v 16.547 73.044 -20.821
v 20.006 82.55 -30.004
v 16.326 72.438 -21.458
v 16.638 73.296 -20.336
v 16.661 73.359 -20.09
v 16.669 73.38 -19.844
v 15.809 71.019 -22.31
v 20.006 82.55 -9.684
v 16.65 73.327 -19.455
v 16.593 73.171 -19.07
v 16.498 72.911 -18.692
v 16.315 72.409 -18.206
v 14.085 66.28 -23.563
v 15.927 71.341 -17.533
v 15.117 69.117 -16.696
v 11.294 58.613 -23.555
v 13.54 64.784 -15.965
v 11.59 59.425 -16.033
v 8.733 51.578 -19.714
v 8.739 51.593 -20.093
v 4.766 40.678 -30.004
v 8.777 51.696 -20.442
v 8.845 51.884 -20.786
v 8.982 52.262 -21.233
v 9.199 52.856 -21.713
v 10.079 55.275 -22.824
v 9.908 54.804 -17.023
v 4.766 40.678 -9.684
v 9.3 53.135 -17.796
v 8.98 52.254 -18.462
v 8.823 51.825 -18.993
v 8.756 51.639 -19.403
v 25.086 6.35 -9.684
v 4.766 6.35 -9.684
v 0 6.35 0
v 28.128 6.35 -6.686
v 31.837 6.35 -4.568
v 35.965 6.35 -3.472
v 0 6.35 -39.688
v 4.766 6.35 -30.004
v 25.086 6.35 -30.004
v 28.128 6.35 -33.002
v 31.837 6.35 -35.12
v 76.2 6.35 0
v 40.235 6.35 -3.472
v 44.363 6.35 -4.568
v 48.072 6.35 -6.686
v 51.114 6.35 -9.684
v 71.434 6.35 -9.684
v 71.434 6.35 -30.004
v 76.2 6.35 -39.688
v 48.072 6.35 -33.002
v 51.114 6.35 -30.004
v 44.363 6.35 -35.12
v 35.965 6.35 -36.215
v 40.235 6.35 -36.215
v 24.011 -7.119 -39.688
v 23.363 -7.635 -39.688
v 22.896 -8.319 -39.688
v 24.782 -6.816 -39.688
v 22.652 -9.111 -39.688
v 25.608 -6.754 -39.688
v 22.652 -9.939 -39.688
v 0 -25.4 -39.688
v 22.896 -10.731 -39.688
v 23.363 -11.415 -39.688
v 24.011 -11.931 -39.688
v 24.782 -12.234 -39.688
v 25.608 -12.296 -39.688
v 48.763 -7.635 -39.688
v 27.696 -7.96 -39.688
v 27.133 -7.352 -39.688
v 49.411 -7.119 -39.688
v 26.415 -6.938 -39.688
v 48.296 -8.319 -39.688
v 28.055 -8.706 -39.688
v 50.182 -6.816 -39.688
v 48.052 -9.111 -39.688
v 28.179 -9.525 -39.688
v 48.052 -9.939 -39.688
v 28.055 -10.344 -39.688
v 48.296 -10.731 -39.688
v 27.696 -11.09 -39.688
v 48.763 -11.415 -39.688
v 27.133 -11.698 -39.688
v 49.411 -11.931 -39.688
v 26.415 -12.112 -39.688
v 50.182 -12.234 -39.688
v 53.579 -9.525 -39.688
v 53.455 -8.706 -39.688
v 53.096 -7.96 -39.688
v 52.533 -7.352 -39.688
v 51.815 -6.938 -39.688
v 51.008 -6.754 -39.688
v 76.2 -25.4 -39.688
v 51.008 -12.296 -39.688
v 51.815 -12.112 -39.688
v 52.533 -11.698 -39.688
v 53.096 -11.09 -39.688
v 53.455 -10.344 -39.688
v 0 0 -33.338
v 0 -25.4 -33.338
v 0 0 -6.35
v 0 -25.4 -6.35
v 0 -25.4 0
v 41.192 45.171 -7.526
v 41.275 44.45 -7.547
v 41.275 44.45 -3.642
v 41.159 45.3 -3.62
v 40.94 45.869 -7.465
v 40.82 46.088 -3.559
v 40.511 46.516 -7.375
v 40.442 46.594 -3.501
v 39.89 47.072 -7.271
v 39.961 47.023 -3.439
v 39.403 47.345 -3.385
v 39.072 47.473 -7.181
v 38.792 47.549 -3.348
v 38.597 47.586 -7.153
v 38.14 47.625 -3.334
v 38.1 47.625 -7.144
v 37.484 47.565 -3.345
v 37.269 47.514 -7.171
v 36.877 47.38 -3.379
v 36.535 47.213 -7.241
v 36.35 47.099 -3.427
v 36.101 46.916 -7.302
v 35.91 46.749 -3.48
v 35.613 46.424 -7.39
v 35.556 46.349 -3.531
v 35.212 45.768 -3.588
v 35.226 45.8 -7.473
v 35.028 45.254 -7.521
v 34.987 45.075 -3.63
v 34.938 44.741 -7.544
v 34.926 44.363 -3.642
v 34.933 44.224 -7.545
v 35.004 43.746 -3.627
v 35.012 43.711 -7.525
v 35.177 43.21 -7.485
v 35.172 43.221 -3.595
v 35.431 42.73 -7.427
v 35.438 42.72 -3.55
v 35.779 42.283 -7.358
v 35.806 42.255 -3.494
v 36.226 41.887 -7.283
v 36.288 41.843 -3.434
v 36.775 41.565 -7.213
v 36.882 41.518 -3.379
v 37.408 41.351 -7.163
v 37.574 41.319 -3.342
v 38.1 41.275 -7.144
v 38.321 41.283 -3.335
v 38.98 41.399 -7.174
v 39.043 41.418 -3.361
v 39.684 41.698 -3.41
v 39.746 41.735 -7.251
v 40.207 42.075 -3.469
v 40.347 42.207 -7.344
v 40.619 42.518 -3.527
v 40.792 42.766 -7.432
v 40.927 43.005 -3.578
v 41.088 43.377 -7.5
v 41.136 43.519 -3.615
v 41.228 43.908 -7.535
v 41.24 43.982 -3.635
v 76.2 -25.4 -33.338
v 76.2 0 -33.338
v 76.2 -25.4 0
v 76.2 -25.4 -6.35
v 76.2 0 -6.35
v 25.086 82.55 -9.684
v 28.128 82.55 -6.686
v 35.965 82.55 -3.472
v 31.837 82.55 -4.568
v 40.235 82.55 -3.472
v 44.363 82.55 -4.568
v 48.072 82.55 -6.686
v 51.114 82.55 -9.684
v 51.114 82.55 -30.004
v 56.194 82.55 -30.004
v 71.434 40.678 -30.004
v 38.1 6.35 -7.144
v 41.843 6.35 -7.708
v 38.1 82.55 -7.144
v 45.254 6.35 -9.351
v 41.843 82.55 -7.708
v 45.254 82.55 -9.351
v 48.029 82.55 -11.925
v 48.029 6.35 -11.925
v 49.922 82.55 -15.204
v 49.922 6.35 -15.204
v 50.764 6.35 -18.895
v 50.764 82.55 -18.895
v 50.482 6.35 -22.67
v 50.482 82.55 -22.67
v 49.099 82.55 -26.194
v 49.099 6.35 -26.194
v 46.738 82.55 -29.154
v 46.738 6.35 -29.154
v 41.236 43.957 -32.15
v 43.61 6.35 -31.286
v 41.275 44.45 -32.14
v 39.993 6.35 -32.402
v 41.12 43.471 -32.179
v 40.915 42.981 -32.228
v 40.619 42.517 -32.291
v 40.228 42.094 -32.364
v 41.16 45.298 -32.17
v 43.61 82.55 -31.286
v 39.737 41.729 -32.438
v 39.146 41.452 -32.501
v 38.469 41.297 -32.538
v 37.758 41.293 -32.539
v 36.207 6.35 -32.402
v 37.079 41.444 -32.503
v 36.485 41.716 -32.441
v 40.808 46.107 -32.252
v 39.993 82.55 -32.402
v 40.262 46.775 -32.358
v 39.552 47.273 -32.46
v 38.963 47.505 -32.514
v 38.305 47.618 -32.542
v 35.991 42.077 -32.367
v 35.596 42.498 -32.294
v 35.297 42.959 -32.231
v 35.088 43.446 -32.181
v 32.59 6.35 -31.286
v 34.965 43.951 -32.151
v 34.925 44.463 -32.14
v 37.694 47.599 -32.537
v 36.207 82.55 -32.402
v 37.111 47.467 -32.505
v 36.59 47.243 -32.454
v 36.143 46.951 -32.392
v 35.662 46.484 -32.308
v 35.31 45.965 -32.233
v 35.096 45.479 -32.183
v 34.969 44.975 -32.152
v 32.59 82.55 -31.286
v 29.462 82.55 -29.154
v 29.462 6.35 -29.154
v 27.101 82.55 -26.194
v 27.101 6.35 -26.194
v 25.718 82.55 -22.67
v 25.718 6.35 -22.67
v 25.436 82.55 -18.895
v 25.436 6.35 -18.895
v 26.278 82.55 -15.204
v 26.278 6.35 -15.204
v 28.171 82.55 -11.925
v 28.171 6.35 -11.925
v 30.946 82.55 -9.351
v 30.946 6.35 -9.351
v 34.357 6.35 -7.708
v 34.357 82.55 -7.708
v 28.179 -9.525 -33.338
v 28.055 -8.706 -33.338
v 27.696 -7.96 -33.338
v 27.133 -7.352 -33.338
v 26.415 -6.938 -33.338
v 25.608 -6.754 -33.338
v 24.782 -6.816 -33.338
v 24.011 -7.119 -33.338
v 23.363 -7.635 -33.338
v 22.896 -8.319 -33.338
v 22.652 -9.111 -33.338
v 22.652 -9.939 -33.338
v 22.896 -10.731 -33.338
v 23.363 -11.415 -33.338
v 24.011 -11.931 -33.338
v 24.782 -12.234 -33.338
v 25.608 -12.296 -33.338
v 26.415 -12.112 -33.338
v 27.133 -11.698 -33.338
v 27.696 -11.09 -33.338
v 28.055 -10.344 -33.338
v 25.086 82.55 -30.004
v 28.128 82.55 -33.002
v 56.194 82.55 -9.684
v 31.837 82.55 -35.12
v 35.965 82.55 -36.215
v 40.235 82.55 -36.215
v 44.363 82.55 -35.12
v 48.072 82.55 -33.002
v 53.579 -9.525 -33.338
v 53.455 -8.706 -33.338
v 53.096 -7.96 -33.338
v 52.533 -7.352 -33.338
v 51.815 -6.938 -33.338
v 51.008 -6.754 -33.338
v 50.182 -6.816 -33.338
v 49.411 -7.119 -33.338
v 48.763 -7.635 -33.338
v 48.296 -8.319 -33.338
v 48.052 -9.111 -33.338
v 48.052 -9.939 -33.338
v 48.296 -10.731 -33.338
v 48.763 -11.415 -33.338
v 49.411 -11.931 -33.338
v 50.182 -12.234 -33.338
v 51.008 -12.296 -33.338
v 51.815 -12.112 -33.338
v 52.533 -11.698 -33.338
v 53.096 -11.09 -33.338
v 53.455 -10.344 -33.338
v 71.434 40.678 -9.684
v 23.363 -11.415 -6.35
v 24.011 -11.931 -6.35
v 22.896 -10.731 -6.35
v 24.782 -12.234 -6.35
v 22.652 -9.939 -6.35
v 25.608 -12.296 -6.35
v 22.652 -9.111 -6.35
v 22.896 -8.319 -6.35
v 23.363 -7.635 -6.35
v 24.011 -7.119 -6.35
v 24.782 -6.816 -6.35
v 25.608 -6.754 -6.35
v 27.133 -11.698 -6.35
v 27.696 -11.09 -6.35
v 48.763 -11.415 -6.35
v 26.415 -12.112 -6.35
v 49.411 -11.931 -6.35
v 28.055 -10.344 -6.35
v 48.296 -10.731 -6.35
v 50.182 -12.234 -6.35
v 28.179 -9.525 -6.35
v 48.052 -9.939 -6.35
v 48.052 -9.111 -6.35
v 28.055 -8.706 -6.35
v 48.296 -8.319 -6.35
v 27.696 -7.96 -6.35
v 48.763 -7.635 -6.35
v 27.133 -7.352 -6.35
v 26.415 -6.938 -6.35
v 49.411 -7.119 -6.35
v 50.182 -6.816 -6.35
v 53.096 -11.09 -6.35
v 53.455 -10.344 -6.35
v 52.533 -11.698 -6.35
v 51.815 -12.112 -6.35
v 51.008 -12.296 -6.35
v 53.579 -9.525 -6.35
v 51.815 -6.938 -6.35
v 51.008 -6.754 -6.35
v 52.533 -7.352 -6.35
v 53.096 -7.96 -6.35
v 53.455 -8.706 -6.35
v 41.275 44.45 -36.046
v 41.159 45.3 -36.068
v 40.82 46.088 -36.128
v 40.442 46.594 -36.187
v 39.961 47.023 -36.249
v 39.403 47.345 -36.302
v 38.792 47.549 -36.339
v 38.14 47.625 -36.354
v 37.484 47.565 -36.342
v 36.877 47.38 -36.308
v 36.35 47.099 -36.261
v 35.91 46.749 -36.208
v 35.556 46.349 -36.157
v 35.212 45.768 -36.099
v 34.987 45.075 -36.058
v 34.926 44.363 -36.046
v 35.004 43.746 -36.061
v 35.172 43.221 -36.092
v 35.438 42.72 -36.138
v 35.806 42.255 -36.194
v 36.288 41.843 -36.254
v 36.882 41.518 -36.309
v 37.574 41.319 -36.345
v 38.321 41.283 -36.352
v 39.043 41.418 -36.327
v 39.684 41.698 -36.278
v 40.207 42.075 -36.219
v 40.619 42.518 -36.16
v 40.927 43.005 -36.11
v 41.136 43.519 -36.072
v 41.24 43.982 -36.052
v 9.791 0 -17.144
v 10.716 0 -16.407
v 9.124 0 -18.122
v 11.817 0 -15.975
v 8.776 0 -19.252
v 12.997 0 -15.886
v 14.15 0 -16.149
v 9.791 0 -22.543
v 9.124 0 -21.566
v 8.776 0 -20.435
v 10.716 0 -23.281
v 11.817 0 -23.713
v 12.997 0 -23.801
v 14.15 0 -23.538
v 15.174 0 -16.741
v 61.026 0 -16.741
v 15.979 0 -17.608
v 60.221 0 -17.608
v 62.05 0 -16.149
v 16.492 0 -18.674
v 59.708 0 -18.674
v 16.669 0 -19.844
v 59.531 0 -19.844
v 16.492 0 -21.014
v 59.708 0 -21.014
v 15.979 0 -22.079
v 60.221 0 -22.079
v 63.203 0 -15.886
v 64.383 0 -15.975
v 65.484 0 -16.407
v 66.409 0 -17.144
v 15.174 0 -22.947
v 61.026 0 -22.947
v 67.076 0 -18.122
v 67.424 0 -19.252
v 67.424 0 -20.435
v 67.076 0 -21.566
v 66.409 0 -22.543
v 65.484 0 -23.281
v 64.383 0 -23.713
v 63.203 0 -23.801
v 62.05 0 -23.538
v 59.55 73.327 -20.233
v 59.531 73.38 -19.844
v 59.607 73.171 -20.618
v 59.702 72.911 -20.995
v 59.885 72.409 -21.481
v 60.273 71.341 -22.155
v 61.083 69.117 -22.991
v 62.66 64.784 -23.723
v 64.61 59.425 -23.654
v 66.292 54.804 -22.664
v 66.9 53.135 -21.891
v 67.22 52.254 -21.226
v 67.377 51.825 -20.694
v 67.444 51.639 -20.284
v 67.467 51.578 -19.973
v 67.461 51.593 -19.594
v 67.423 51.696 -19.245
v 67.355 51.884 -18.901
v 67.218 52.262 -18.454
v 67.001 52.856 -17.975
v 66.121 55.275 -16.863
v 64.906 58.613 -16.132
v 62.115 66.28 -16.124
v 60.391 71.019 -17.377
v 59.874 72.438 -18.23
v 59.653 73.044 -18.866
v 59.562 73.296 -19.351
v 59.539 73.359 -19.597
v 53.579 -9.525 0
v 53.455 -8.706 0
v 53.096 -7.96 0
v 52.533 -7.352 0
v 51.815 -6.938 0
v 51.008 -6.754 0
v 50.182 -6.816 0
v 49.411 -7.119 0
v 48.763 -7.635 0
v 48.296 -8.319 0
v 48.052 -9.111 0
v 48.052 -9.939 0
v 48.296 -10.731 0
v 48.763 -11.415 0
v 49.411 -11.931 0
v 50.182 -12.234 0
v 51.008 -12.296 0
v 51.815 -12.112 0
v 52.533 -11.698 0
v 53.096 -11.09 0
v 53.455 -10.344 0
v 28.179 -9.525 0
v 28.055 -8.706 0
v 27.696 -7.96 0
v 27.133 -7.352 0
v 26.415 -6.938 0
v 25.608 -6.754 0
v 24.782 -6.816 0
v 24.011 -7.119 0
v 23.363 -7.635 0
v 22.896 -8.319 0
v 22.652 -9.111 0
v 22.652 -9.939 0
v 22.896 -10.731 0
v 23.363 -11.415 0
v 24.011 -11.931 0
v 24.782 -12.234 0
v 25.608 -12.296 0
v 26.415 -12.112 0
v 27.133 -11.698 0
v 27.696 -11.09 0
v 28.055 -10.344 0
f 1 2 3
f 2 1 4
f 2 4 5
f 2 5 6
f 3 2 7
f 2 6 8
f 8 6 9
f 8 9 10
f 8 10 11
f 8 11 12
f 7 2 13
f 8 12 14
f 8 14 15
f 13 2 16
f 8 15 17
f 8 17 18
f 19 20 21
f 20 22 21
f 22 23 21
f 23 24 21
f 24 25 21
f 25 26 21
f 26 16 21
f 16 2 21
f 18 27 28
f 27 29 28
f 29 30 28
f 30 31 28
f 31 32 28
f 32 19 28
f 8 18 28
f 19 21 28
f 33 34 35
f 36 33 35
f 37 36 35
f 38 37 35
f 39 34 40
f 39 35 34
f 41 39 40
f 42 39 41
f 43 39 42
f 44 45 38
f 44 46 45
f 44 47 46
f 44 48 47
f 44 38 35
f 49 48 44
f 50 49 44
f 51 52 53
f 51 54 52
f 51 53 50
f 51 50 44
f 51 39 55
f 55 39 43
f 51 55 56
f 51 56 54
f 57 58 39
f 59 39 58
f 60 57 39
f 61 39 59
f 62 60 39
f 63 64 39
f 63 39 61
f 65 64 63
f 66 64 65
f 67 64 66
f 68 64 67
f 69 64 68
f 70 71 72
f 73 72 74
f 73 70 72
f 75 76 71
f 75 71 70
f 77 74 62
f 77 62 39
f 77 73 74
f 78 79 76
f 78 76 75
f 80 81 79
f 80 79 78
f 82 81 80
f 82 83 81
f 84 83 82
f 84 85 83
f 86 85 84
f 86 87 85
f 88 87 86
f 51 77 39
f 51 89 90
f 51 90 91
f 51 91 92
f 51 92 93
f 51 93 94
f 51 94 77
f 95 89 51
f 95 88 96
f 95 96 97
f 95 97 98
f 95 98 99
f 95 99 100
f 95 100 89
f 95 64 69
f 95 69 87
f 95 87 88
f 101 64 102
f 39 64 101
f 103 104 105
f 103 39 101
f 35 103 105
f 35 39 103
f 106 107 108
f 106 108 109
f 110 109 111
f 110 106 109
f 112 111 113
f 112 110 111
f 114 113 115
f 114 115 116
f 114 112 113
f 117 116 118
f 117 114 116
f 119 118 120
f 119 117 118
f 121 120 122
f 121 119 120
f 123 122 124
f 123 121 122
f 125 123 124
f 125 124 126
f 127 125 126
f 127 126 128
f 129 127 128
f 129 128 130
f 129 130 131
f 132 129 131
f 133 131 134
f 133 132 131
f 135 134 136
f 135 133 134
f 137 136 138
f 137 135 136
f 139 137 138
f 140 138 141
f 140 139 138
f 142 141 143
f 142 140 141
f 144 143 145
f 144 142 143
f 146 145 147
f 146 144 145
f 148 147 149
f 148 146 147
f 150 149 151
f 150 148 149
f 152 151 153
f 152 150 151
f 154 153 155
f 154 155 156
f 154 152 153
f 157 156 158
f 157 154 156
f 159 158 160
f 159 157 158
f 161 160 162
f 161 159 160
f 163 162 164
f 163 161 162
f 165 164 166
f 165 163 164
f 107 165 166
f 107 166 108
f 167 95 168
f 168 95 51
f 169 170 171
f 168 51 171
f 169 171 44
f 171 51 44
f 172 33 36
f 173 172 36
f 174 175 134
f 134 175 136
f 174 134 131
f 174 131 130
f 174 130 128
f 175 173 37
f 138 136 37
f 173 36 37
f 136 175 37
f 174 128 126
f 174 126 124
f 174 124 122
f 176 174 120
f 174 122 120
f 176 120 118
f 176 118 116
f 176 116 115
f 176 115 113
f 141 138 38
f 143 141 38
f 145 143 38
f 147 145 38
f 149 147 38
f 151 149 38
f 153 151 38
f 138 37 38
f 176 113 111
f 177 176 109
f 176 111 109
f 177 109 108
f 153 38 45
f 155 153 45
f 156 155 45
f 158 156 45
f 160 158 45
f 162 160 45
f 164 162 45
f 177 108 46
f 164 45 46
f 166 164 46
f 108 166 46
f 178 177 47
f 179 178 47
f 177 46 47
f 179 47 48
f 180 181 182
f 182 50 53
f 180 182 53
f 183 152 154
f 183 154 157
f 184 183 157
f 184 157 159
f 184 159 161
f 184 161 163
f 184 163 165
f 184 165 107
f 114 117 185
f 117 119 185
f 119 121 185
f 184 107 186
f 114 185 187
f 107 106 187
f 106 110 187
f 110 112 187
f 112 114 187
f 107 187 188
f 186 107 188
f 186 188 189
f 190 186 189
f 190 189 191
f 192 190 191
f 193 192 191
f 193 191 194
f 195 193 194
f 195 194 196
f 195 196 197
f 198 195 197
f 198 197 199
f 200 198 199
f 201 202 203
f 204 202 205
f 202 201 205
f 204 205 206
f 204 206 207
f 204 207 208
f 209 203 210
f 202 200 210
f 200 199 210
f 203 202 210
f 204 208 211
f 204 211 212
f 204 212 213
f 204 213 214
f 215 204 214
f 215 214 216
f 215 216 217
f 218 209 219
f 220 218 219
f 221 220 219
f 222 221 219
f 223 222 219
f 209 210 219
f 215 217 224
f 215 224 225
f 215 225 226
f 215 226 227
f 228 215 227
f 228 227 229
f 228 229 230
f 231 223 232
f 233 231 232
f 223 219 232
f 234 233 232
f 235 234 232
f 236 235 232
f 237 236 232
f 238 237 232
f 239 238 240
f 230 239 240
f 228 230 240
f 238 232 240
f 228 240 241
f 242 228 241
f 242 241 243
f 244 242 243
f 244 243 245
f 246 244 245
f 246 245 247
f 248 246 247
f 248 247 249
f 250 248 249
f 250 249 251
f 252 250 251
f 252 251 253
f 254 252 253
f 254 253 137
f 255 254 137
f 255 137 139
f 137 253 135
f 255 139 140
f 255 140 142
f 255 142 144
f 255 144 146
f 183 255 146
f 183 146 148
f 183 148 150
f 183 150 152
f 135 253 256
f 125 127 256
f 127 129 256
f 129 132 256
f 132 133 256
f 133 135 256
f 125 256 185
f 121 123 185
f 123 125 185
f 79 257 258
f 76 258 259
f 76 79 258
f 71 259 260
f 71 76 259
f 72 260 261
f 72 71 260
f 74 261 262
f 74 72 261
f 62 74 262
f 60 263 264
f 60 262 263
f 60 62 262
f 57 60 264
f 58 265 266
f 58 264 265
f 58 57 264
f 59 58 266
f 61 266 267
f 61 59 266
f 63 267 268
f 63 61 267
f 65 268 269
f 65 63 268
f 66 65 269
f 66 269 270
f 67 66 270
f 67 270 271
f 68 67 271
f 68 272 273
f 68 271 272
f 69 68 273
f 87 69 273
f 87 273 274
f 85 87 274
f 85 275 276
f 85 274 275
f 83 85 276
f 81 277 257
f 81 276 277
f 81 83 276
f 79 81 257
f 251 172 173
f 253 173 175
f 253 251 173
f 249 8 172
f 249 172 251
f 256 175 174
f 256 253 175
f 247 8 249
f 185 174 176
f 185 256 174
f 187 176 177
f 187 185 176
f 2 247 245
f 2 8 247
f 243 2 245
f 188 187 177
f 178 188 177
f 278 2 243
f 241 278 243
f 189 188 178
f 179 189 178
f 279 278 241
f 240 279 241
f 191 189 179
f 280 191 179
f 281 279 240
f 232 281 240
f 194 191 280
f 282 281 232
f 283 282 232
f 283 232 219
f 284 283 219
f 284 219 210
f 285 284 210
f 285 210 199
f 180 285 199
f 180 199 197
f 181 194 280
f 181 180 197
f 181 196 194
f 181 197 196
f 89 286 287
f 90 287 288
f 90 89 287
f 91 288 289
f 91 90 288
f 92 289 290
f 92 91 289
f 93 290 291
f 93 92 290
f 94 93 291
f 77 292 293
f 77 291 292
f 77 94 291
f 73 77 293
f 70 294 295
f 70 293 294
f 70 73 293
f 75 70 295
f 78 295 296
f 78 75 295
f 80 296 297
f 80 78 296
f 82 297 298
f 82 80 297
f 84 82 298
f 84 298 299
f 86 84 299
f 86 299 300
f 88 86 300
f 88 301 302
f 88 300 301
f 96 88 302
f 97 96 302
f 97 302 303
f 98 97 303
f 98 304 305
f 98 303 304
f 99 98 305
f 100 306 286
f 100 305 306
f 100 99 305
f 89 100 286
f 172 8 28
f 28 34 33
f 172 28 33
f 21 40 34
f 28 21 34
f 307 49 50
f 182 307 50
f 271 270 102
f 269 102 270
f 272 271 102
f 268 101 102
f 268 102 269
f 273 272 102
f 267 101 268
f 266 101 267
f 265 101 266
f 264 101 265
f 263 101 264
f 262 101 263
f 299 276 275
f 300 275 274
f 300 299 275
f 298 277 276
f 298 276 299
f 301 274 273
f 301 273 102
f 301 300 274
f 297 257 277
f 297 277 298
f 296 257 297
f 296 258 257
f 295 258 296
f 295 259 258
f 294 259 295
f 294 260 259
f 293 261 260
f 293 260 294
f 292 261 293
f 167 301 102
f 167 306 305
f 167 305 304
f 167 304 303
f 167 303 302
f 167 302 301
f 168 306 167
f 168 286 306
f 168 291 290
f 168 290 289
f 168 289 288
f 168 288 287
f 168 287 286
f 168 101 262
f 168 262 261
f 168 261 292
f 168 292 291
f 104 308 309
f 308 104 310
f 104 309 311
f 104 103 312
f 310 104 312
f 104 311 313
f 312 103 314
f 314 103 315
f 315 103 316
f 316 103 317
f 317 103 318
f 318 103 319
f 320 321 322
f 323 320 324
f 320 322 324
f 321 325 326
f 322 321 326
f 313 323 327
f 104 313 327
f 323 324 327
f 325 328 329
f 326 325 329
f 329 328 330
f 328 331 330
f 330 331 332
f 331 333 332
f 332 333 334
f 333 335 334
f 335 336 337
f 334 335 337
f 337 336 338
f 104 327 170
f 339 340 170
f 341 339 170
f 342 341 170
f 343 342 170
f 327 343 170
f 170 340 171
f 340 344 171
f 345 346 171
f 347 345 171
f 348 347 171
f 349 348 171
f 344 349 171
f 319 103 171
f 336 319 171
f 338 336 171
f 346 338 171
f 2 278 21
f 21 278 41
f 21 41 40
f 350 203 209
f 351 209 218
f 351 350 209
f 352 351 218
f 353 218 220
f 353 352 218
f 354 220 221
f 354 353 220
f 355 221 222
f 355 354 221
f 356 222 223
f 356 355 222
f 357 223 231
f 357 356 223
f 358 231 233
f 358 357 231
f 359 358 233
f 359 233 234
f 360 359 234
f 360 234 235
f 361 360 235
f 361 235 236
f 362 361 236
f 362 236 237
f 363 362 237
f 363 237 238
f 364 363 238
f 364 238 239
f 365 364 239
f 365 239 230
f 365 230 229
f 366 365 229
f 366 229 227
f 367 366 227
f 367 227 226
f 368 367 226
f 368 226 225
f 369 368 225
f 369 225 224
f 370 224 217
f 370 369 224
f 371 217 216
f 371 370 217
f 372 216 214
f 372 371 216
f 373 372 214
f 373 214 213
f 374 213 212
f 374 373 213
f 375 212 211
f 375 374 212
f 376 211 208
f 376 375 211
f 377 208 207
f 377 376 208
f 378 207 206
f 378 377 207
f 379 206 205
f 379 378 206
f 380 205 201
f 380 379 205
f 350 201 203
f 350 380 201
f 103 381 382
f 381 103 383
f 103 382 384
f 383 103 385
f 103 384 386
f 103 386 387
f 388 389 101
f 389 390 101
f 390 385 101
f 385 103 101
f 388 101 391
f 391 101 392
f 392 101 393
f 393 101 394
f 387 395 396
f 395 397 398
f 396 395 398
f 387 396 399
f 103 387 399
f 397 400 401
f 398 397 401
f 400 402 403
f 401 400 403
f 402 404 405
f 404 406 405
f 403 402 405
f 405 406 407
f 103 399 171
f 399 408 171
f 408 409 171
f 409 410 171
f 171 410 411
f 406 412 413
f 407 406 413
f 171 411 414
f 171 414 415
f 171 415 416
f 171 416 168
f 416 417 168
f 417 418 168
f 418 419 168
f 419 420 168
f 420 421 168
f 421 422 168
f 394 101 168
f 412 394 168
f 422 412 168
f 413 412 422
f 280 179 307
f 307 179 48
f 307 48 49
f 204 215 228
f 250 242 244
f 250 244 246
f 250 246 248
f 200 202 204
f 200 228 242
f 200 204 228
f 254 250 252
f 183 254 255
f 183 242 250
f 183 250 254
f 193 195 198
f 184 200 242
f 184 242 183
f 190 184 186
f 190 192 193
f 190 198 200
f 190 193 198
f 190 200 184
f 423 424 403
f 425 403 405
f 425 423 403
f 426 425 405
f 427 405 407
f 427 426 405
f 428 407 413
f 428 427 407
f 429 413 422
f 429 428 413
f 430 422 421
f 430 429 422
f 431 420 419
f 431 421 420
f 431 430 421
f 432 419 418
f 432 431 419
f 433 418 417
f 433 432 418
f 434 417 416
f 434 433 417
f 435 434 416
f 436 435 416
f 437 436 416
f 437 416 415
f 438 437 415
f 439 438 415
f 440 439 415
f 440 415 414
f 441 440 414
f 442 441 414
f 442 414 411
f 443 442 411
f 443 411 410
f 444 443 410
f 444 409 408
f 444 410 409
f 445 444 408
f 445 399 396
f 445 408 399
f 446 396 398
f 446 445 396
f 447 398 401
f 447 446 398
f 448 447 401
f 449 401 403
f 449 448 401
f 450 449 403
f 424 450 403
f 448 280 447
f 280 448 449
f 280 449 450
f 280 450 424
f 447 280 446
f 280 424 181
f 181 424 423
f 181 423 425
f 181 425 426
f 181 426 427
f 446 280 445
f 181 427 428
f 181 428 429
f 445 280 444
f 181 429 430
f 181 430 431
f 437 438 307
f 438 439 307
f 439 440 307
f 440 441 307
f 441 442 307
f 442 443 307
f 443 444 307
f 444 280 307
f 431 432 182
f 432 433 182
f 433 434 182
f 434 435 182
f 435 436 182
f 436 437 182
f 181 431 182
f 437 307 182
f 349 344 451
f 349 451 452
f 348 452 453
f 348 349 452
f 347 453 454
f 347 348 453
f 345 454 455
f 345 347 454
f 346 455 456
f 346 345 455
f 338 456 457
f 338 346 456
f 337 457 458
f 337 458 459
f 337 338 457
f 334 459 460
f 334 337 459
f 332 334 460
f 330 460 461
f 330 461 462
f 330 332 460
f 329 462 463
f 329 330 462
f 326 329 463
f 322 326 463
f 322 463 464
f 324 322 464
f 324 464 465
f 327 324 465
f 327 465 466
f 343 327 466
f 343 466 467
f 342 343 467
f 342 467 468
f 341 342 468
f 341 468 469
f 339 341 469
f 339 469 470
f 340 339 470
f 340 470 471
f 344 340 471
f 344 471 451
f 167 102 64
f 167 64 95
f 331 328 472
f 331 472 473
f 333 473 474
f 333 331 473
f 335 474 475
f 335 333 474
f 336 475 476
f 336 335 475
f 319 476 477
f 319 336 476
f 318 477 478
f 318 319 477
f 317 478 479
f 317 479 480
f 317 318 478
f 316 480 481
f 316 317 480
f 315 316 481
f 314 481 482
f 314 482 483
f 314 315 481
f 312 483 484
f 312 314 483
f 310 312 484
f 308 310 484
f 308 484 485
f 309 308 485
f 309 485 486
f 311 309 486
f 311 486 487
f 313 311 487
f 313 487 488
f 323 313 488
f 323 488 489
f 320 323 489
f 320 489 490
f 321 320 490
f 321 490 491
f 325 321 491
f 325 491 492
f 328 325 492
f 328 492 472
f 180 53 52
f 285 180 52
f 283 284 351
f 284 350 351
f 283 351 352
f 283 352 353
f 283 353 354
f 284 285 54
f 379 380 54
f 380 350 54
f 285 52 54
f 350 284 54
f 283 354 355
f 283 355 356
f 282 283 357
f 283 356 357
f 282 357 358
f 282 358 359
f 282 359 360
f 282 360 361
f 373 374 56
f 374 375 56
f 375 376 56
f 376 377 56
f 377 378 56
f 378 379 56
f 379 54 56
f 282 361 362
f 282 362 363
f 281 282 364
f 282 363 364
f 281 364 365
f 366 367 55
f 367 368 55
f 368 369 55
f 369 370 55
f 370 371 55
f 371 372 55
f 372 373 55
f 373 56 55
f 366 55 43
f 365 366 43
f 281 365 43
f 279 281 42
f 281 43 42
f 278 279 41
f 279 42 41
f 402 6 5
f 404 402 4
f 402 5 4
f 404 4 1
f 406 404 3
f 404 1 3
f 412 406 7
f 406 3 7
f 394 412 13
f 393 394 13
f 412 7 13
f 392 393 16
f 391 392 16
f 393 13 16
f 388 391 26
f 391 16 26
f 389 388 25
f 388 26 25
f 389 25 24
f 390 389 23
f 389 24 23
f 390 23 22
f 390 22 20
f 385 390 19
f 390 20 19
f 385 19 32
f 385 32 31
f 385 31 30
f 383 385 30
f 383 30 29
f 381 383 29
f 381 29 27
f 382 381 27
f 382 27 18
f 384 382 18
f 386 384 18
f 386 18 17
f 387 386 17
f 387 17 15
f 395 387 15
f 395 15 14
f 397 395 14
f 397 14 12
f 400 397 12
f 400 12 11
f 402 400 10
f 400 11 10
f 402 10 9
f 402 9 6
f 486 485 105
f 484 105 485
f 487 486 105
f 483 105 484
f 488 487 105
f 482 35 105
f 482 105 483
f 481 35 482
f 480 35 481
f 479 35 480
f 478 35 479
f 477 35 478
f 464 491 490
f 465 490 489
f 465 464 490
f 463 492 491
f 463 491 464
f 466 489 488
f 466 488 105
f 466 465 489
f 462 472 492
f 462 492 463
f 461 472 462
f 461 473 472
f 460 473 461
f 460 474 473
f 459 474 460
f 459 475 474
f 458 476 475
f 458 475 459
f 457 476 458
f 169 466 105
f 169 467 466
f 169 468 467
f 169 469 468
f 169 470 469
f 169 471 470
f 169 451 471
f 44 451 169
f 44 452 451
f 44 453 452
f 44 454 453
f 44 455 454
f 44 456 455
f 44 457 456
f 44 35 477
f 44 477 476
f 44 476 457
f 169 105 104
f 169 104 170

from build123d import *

# Parameters (mm, degrees)
SKETCH1_W                                 = 76.2
SKETCH1_H                                 = 39.6875
BASE_DEPTH                                = 6.35
SKETCH2_W                                 = 76.2
SKETCH2_H                                 = 6.35
WALLS_DEPTH                               = 25.4
SCREW_START                               = -39.6875
SCREW_HOLE_OUTLINE_R                      = 2.77876
SCREW_HOLE_DEPTH                          = 39.6875
HOLE_PATTERN_COUNT                        = 2
HOLE_PATTERN_PITCH                        = 25.4
TOP_SECTION_DEPTH                         = 76.2
BOLT_HOLE_CHAMFER_SIZE                    = 15.24
BOLT_HOLE_CHAMFER_SIZE2                   = 41.871555872
SKETCH24_R                                = 12.7
TEMP_POLE_HOLE_DEPTH                      = 76.2
SKETCH26_R                                = 3.96875
TEMP_BOLT_HOLES_DEPTH                     = 138.966445762
TOP_SECTION_BROOM_SUPPORT_HOLE_DEPTH      = 115.222803793
TOP_SECTION_BROOM_SUPPORT_HOLE_DEPTH_BACK = 115.222803793
SKETCH28_R                                = 3.175


# Read off the part's stored shape, not the designer's step: Screw hole
with BuildPart() as part:
    # Sketch1 → Base (new body)
    with BuildSketch(Plane(origin=(0, 0, 0), x_dir=(1, 0, 0), z_dir=(0, 1, 0))):
        with Locations((38.1, 19.84375)):
            Rectangle(SKETCH1_W, SKETCH1_H)
    extrude(amount=BASE_DEPTH)

    # Sketch2 → Walls (add)
    with BuildSketch(Plane.XZ):
        with Locations((38.1, -3.175)):
            Rectangle(SKETCH2_W, SKETCH2_H)
        with Locations((38.1, -36.5125)):
            Rectangle(SKETCH2_W, SKETCH2_H)
    extrude(amount=WALLS_DEPTH)

    # Screw hole outline → Screw hole (cut)
    with BuildSketch(Plane.XY.offset(SCREW_START)):
        with Locations((50.8, -9.525)):
            Circle(SCREW_HOLE_OUTLINE_R)
    screw_hole = extrude(amount=SCREW_HOLE_DEPTH, mode=Mode.SUBTRACT)

    # Hole pattern: Screw hole ×2
    with Locations(*[(-i * HOLE_PATTERN_PITCH, 0, 0) for i in range(1, HOLE_PATTERN_COUNT)]):
        add(screw_hole, mode=Mode.SUBTRACT)

    # Sketch7 → Top section (add)
    with BuildSketch(Plane(origin=(0, 6.35, 0), x_dir=(1, 0, 0), z_dir=(0, 1, 0))):
        with BuildLine():
            Line((4.766372527, 30.00375), (4.766372527, 9.68375))
            Line((4.766372527, 9.68375), (25.086372527, 9.68375))
            ThreePointArc((25.086372527, 9.68375), (21.59, 19.84375), (25.086372527, 30.00375))
            Line((25.086372527, 30.00375), (4.766372527, 30.00375))
        make_face()
        with BuildLine():
            ThreePointArc((25.086372527, 30.00375), (21.59, 19.84375), (25.086372527, 9.68375))
            Line((25.086372527, 9.68375), (25.086372527, 30.00375))
        make_face()
        with BuildLine():
            Line((25.086372527, 30.00375), (25.086372527, 9.68375))
            ThreePointArc((25.086372527, 9.68375), (38.1, 3.33375), (51.113627473, 9.68375))
            Line((51.113627473, 9.68375), (51.113627473, 30.00375))
            ThreePointArc((51.113627473, 30.00375), (38.1, 36.35375), (25.086372527, 30.00375))
        make_face()
        with BuildLine():
            Line((51.113627473, 30.00375), (51.113627473, 9.68375))
            ThreePointArc((51.113627473, 9.68375), (53.711455563, 14.471361778), (54.61, 19.84375))
            ThreePointArc((54.61, 19.84375), (53.711455563, 25.216138222), (51.113627473, 30.00375))
        make_face()
        with BuildLine():
            ThreePointArc((54.61, 19.84375), (53.711455563, 14.471361778), (51.113627473, 9.68375))
            Line((51.113627473, 9.68375), (71.433627473, 9.68375))
            Line((71.433627473, 9.68375), (71.433627473, 30.00375))
            Line((71.433627473, 30.00375), (51.113627473, 30.00375))
            ThreePointArc((51.113627473, 30.00375), (53.711455563, 25.216138222), (54.61, 19.84375))
        make_face()
    extrude(amount=TOP_SECTION_DEPTH)

    # Bolt hole chamfer
    bolt_hole_chamfer_edges = [part.edges().sort_by_distance(p)[0] for p in [
        (4.766372527, 82.55, -19.84375),
        (71.433627473, 82.55, -19.84375),
    ]]
    bolt_hole_chamfer_side = [part.faces().sort_by_distance(p)[0] for p in [
        (38.1, 82.55, -19.84375),
    ]]
    chamfer(bolt_hole_chamfer_edges, length=BOLT_HOLE_CHAMFER_SIZE, length2=BOLT_HOLE_CHAMFER_SIZE2, reference=bolt_hole_chamfer_side[0])

    # Sketch24 → Temp Pole Hole (cut)
    with BuildSketch(Plane(origin=(0, 82.55, 0), x_dir=(1, 0, 0), z_dir=(0, 1, 0))):
        with Locations(Location((38.1, 19.84375, 0), (0, 0, 270))):
            Circle(SKETCH24_R)
    extrude(amount=-TEMP_POLE_HOLE_DEPTH, mode=Mode.SUBTRACT)

    # Sketch26 → Temp bolt holes (cut, through all)
    with BuildSketch(Plane(origin=(0, 82.55, 0), x_dir=(1, 0, 0), z_dir=(0, 1, 0))):
        with Locations((12.7, 19.84375)):
            Circle(SKETCH26_R)
    temp_bolt_holes = extrude(amount=-TEMP_BOLT_HOLES_DEPTH, mode=Mode.SUBTRACT)

    # Temp bolt hole mirror: Temp bolt holes across plane
    add(temp_bolt_holes.mirror(Plane(origin=(38.1, 0, 0), x_dir=(0, 0, 1), z_dir=(1, 0, 0))), mode=Mode.SUBTRACT)

    # Sketch28 → Top section broom support hole (cut, two sides: drawn at the far end of the back side and taken through both)
    with BuildSketch(Plane.XY.offset(-19.05).offset(-TOP_SECTION_BROOM_SUPPORT_HOLE_DEPTH_BACK)):
        with Locations((38.1, 44.45)):
            Circle(SKETCH28_R)
    extrude(amount=TOP_SECTION_BROOM_SUPPORT_HOLE_DEPTH + TOP_SECTION_BROOM_SUPPORT_HOLE_DEPTH_BACK, mode=Mode.SUBTRACT)


solid = part.part
